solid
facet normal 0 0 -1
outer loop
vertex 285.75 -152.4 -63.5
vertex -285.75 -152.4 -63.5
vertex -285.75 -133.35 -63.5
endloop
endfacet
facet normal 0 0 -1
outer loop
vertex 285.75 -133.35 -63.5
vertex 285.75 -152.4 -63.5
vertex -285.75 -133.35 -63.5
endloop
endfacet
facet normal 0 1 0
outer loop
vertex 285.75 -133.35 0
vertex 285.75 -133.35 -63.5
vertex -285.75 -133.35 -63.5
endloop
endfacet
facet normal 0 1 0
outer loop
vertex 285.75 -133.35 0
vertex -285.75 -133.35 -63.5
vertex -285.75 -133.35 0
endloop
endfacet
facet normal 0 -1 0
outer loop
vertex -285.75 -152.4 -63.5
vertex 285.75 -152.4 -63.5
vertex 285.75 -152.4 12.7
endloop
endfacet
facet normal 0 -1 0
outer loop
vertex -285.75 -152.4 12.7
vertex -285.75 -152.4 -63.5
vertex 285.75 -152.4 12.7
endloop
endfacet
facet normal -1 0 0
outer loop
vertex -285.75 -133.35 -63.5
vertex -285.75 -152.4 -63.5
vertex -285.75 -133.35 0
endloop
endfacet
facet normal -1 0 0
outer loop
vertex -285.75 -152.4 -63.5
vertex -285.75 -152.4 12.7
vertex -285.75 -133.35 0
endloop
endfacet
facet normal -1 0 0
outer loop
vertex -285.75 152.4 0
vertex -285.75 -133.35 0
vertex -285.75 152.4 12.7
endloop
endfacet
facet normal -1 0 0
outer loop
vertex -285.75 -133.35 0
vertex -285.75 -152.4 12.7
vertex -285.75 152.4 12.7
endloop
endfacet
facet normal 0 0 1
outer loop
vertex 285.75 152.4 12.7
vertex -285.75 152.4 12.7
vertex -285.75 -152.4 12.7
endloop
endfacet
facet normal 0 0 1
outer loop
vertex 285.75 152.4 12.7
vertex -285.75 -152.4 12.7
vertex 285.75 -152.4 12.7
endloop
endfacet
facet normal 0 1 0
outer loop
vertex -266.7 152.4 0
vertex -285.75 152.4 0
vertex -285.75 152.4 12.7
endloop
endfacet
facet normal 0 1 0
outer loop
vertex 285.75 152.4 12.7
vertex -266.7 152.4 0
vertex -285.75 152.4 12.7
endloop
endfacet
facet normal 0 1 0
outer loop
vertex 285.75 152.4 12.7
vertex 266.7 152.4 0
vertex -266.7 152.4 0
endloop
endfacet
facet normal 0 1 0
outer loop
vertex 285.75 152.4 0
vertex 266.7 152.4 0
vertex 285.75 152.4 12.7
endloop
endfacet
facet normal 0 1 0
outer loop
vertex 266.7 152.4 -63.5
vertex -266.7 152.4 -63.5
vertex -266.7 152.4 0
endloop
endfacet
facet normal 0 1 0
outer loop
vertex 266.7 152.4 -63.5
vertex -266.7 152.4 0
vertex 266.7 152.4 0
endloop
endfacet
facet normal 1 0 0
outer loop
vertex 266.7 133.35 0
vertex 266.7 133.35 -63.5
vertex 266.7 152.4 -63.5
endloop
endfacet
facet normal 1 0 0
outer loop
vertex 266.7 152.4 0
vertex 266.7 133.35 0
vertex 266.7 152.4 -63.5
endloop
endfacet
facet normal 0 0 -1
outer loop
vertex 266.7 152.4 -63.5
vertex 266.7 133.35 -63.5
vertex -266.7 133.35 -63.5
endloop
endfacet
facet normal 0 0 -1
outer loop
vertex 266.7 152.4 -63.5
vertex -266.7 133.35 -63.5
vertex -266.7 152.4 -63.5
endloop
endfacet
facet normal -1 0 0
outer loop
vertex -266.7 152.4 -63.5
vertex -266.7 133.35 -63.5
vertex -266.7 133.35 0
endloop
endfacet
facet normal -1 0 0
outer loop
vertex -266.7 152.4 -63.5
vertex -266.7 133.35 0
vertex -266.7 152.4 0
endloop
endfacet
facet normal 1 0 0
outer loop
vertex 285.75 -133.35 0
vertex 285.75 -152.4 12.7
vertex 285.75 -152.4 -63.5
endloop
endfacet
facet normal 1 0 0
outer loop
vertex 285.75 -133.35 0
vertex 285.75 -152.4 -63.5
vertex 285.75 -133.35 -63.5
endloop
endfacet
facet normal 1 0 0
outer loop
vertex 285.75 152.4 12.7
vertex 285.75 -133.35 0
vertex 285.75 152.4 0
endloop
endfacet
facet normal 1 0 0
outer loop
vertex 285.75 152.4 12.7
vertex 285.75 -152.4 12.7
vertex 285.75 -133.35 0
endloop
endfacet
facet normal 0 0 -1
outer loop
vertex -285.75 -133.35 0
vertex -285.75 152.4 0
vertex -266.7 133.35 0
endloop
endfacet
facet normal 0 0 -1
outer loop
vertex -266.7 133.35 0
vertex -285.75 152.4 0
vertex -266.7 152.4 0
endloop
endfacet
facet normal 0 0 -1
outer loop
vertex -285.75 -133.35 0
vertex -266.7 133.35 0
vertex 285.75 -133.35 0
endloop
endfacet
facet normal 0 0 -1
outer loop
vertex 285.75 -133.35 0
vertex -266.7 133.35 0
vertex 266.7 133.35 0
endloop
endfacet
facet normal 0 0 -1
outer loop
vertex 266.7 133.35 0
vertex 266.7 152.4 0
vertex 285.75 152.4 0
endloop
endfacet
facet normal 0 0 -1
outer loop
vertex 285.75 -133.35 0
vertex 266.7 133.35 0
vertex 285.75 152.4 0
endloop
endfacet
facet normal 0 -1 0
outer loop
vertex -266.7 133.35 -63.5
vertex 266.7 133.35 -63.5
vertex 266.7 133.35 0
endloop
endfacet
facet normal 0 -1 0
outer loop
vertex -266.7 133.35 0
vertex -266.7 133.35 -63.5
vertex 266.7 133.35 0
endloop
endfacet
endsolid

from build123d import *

# Parameters (mm, degrees)
F0_W     = 571.5
F0_H     = 304.8
F1_DEPTH = 12.7
F2_W     = 19.05
F2_H     = 63.5
F3_DEPTH = 285.75
F4_W     = 19.05
F4_H     = 63.5
F5_DEPTH = 266.7


with BuildPart() as f1:
    # F0 (on Top) → F1 (new body)
    with BuildSketch(Plane.XY):
        Rectangle(F0_W, F0_H)
    extrude(amount=F1_DEPTH)

    # F2 (on Right) → F3 (join, symmetric)
    with BuildSketch(Plane.YZ):
        with Locations((-142.875, -31.75)):
            Rectangle(F2_W, F2_H)
    extrude(amount=F3_DEPTH, both=True)

    # F4 (on Right) → F5 (join, symmetric)
    with BuildSketch(Plane.YZ):
        with Locations((142.875, -31.75)):
            Rectangle(F4_W, F4_H)
    extrude(amount=F5_DEPTH, both=True)


solid = f1.part
